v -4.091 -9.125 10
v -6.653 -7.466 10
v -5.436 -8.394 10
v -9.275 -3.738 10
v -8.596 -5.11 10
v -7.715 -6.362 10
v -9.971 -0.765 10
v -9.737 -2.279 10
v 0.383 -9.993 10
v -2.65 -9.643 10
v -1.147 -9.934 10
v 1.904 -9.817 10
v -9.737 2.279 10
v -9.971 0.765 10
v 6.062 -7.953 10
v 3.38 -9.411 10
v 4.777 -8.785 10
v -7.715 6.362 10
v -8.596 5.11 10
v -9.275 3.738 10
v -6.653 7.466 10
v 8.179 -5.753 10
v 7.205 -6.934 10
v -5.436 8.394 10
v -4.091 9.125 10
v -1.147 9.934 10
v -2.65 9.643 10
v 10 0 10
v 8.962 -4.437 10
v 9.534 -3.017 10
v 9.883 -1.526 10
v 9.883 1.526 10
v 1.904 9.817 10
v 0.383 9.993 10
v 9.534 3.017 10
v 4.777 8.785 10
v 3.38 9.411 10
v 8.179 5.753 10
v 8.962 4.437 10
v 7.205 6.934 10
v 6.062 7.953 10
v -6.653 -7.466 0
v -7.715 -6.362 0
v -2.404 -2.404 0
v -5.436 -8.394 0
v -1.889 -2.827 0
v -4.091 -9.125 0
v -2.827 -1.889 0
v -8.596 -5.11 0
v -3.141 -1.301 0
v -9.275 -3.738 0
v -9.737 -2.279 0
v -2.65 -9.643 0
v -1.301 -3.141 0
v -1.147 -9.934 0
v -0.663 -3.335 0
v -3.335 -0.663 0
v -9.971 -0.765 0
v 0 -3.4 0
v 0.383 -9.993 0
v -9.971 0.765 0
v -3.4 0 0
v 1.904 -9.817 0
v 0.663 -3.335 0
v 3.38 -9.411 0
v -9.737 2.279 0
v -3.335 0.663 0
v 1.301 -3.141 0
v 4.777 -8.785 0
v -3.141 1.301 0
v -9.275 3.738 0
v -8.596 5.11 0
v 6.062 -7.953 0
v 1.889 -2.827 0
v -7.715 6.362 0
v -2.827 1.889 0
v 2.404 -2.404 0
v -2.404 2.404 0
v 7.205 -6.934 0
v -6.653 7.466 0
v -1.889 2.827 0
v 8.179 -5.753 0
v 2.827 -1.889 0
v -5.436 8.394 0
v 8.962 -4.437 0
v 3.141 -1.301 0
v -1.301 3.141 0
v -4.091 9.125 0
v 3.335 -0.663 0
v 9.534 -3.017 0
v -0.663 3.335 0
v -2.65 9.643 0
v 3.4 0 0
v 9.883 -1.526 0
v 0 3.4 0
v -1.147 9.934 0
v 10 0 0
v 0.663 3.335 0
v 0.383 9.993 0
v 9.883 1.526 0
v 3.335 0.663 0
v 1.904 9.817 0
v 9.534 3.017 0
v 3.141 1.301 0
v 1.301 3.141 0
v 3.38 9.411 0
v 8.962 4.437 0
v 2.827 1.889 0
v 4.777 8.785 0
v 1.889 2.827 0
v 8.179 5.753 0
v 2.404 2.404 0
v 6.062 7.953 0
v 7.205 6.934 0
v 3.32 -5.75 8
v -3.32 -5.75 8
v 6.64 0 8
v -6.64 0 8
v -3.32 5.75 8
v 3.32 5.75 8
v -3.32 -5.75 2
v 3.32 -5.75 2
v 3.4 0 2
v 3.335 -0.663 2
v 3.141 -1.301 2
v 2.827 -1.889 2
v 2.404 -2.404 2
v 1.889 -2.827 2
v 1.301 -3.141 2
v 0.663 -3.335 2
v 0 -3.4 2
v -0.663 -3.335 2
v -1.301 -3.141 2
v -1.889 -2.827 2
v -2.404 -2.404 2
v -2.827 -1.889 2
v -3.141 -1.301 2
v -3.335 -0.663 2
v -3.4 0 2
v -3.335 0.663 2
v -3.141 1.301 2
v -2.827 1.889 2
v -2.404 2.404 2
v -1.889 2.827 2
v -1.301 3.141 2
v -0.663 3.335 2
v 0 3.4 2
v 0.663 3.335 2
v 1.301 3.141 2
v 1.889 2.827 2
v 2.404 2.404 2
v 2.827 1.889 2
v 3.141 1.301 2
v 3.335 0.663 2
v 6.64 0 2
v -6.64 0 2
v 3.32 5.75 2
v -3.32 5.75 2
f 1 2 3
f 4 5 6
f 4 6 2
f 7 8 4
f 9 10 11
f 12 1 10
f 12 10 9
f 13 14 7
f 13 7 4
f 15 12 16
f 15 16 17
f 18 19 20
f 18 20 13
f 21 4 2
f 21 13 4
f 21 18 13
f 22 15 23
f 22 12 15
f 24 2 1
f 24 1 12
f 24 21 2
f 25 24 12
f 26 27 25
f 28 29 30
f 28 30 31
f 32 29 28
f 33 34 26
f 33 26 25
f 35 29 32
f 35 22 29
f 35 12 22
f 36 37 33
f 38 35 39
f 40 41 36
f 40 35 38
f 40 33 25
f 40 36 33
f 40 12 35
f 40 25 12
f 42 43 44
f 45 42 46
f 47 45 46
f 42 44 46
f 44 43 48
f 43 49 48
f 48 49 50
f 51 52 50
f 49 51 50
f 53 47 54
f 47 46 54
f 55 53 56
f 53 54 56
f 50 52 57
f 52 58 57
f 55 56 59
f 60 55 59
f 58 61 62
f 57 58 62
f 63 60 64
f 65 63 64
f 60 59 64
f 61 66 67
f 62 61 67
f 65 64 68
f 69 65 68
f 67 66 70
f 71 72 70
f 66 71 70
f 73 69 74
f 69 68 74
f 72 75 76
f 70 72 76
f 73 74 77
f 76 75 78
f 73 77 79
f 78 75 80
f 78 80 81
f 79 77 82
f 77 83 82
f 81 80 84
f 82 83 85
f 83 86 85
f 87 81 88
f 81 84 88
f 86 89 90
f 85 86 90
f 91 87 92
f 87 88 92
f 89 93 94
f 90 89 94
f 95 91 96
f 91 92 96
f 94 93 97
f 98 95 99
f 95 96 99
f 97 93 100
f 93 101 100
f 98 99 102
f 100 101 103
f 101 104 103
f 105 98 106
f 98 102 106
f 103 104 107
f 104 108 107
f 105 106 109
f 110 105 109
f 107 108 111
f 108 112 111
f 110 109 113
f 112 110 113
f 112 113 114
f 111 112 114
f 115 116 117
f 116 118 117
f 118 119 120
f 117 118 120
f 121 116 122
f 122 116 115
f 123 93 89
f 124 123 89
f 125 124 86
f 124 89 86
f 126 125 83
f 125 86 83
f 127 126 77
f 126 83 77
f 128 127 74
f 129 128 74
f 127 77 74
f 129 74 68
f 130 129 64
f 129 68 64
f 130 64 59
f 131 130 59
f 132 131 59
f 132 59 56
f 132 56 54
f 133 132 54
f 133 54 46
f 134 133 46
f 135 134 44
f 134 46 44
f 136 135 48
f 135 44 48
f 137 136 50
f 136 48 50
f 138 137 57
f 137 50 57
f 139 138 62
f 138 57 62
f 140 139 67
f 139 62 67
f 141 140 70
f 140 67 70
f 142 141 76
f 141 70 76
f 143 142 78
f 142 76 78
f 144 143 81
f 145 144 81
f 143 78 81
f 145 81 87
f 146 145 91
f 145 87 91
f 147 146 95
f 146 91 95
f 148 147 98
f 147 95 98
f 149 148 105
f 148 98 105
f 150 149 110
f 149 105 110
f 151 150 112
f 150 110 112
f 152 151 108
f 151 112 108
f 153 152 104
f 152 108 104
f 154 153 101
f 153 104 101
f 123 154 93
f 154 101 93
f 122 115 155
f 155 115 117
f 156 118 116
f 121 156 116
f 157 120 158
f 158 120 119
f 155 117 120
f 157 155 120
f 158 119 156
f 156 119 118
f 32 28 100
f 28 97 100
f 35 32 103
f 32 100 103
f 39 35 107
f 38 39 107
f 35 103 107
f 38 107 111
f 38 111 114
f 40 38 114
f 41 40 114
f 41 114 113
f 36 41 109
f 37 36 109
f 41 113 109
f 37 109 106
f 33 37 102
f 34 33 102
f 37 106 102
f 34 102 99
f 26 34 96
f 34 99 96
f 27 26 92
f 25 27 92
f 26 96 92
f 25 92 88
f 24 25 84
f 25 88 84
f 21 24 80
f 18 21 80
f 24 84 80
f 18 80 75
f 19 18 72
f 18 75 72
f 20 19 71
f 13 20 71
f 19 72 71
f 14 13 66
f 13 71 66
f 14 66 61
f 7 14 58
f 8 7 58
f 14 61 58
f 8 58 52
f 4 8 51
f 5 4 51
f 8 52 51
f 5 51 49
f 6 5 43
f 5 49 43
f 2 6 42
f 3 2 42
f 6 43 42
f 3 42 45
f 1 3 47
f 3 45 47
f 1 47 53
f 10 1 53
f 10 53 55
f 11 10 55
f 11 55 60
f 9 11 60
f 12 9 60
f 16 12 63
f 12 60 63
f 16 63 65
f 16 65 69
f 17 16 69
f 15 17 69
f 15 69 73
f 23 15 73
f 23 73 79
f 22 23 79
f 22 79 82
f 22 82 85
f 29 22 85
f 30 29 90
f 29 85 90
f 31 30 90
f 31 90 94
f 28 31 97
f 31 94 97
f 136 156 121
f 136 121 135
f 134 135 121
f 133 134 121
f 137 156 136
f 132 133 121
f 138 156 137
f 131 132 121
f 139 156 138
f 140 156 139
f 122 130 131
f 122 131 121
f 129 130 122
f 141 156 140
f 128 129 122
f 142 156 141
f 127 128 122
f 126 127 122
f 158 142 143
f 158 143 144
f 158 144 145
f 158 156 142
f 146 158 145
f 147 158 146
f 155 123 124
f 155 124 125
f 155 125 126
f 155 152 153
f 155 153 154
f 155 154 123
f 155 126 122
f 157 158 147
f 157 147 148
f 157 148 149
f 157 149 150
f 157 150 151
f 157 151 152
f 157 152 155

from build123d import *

# Parameters (mm, degrees)
CYLINDER_R      = 10
CYLINDER_DEPTH  = 8
POCKET_DEPTH    = 6
SKETCH001_R     = 10
PAD_DEPTH       = 2
SKETCH002_R     = 3.4
POCKET001_DEPTH = 2


with BuildPart() as part:
    # Cylinder → Cylinder (new body)
    with BuildSketch(Plane.XY):
        Circle(CYLINDER_R)
    extrude(amount=CYLINDER_DEPTH)

    # Sketch (on Face2 of BaseFeature) → Pocket (cut)
    with BuildSketch(Plane.XY.offset(8)):
        Polygon((3.32, -5.750409), (6.64, 0), (3.32, 5.750409), (-3.32, 5.750409), (-6.64, 0), (-3.32, -5.750409), align=None)
    extrude(amount=-POCKET_DEPTH, mode=Mode.SUBTRACT)

    # Sketch001 (on Face2 of Pocket) → Pad (join)
    with BuildSketch(Plane.XY.offset(8)):
        Circle(SKETCH001_R)
    extrude(amount=PAD_DEPTH)

    # Sketch002 (on Face3 of Pad) → Pocket001 (cut)
    with BuildSketch(Plane(origin=(0, 0, 0), x_dir=(1, 0, 0), z_dir=(0, 0, -1))):
        Circle(SKETCH002_R)
    extrude(amount=-POCKET001_DEPTH, mode=Mode.SUBTRACT)


solid = part.part
